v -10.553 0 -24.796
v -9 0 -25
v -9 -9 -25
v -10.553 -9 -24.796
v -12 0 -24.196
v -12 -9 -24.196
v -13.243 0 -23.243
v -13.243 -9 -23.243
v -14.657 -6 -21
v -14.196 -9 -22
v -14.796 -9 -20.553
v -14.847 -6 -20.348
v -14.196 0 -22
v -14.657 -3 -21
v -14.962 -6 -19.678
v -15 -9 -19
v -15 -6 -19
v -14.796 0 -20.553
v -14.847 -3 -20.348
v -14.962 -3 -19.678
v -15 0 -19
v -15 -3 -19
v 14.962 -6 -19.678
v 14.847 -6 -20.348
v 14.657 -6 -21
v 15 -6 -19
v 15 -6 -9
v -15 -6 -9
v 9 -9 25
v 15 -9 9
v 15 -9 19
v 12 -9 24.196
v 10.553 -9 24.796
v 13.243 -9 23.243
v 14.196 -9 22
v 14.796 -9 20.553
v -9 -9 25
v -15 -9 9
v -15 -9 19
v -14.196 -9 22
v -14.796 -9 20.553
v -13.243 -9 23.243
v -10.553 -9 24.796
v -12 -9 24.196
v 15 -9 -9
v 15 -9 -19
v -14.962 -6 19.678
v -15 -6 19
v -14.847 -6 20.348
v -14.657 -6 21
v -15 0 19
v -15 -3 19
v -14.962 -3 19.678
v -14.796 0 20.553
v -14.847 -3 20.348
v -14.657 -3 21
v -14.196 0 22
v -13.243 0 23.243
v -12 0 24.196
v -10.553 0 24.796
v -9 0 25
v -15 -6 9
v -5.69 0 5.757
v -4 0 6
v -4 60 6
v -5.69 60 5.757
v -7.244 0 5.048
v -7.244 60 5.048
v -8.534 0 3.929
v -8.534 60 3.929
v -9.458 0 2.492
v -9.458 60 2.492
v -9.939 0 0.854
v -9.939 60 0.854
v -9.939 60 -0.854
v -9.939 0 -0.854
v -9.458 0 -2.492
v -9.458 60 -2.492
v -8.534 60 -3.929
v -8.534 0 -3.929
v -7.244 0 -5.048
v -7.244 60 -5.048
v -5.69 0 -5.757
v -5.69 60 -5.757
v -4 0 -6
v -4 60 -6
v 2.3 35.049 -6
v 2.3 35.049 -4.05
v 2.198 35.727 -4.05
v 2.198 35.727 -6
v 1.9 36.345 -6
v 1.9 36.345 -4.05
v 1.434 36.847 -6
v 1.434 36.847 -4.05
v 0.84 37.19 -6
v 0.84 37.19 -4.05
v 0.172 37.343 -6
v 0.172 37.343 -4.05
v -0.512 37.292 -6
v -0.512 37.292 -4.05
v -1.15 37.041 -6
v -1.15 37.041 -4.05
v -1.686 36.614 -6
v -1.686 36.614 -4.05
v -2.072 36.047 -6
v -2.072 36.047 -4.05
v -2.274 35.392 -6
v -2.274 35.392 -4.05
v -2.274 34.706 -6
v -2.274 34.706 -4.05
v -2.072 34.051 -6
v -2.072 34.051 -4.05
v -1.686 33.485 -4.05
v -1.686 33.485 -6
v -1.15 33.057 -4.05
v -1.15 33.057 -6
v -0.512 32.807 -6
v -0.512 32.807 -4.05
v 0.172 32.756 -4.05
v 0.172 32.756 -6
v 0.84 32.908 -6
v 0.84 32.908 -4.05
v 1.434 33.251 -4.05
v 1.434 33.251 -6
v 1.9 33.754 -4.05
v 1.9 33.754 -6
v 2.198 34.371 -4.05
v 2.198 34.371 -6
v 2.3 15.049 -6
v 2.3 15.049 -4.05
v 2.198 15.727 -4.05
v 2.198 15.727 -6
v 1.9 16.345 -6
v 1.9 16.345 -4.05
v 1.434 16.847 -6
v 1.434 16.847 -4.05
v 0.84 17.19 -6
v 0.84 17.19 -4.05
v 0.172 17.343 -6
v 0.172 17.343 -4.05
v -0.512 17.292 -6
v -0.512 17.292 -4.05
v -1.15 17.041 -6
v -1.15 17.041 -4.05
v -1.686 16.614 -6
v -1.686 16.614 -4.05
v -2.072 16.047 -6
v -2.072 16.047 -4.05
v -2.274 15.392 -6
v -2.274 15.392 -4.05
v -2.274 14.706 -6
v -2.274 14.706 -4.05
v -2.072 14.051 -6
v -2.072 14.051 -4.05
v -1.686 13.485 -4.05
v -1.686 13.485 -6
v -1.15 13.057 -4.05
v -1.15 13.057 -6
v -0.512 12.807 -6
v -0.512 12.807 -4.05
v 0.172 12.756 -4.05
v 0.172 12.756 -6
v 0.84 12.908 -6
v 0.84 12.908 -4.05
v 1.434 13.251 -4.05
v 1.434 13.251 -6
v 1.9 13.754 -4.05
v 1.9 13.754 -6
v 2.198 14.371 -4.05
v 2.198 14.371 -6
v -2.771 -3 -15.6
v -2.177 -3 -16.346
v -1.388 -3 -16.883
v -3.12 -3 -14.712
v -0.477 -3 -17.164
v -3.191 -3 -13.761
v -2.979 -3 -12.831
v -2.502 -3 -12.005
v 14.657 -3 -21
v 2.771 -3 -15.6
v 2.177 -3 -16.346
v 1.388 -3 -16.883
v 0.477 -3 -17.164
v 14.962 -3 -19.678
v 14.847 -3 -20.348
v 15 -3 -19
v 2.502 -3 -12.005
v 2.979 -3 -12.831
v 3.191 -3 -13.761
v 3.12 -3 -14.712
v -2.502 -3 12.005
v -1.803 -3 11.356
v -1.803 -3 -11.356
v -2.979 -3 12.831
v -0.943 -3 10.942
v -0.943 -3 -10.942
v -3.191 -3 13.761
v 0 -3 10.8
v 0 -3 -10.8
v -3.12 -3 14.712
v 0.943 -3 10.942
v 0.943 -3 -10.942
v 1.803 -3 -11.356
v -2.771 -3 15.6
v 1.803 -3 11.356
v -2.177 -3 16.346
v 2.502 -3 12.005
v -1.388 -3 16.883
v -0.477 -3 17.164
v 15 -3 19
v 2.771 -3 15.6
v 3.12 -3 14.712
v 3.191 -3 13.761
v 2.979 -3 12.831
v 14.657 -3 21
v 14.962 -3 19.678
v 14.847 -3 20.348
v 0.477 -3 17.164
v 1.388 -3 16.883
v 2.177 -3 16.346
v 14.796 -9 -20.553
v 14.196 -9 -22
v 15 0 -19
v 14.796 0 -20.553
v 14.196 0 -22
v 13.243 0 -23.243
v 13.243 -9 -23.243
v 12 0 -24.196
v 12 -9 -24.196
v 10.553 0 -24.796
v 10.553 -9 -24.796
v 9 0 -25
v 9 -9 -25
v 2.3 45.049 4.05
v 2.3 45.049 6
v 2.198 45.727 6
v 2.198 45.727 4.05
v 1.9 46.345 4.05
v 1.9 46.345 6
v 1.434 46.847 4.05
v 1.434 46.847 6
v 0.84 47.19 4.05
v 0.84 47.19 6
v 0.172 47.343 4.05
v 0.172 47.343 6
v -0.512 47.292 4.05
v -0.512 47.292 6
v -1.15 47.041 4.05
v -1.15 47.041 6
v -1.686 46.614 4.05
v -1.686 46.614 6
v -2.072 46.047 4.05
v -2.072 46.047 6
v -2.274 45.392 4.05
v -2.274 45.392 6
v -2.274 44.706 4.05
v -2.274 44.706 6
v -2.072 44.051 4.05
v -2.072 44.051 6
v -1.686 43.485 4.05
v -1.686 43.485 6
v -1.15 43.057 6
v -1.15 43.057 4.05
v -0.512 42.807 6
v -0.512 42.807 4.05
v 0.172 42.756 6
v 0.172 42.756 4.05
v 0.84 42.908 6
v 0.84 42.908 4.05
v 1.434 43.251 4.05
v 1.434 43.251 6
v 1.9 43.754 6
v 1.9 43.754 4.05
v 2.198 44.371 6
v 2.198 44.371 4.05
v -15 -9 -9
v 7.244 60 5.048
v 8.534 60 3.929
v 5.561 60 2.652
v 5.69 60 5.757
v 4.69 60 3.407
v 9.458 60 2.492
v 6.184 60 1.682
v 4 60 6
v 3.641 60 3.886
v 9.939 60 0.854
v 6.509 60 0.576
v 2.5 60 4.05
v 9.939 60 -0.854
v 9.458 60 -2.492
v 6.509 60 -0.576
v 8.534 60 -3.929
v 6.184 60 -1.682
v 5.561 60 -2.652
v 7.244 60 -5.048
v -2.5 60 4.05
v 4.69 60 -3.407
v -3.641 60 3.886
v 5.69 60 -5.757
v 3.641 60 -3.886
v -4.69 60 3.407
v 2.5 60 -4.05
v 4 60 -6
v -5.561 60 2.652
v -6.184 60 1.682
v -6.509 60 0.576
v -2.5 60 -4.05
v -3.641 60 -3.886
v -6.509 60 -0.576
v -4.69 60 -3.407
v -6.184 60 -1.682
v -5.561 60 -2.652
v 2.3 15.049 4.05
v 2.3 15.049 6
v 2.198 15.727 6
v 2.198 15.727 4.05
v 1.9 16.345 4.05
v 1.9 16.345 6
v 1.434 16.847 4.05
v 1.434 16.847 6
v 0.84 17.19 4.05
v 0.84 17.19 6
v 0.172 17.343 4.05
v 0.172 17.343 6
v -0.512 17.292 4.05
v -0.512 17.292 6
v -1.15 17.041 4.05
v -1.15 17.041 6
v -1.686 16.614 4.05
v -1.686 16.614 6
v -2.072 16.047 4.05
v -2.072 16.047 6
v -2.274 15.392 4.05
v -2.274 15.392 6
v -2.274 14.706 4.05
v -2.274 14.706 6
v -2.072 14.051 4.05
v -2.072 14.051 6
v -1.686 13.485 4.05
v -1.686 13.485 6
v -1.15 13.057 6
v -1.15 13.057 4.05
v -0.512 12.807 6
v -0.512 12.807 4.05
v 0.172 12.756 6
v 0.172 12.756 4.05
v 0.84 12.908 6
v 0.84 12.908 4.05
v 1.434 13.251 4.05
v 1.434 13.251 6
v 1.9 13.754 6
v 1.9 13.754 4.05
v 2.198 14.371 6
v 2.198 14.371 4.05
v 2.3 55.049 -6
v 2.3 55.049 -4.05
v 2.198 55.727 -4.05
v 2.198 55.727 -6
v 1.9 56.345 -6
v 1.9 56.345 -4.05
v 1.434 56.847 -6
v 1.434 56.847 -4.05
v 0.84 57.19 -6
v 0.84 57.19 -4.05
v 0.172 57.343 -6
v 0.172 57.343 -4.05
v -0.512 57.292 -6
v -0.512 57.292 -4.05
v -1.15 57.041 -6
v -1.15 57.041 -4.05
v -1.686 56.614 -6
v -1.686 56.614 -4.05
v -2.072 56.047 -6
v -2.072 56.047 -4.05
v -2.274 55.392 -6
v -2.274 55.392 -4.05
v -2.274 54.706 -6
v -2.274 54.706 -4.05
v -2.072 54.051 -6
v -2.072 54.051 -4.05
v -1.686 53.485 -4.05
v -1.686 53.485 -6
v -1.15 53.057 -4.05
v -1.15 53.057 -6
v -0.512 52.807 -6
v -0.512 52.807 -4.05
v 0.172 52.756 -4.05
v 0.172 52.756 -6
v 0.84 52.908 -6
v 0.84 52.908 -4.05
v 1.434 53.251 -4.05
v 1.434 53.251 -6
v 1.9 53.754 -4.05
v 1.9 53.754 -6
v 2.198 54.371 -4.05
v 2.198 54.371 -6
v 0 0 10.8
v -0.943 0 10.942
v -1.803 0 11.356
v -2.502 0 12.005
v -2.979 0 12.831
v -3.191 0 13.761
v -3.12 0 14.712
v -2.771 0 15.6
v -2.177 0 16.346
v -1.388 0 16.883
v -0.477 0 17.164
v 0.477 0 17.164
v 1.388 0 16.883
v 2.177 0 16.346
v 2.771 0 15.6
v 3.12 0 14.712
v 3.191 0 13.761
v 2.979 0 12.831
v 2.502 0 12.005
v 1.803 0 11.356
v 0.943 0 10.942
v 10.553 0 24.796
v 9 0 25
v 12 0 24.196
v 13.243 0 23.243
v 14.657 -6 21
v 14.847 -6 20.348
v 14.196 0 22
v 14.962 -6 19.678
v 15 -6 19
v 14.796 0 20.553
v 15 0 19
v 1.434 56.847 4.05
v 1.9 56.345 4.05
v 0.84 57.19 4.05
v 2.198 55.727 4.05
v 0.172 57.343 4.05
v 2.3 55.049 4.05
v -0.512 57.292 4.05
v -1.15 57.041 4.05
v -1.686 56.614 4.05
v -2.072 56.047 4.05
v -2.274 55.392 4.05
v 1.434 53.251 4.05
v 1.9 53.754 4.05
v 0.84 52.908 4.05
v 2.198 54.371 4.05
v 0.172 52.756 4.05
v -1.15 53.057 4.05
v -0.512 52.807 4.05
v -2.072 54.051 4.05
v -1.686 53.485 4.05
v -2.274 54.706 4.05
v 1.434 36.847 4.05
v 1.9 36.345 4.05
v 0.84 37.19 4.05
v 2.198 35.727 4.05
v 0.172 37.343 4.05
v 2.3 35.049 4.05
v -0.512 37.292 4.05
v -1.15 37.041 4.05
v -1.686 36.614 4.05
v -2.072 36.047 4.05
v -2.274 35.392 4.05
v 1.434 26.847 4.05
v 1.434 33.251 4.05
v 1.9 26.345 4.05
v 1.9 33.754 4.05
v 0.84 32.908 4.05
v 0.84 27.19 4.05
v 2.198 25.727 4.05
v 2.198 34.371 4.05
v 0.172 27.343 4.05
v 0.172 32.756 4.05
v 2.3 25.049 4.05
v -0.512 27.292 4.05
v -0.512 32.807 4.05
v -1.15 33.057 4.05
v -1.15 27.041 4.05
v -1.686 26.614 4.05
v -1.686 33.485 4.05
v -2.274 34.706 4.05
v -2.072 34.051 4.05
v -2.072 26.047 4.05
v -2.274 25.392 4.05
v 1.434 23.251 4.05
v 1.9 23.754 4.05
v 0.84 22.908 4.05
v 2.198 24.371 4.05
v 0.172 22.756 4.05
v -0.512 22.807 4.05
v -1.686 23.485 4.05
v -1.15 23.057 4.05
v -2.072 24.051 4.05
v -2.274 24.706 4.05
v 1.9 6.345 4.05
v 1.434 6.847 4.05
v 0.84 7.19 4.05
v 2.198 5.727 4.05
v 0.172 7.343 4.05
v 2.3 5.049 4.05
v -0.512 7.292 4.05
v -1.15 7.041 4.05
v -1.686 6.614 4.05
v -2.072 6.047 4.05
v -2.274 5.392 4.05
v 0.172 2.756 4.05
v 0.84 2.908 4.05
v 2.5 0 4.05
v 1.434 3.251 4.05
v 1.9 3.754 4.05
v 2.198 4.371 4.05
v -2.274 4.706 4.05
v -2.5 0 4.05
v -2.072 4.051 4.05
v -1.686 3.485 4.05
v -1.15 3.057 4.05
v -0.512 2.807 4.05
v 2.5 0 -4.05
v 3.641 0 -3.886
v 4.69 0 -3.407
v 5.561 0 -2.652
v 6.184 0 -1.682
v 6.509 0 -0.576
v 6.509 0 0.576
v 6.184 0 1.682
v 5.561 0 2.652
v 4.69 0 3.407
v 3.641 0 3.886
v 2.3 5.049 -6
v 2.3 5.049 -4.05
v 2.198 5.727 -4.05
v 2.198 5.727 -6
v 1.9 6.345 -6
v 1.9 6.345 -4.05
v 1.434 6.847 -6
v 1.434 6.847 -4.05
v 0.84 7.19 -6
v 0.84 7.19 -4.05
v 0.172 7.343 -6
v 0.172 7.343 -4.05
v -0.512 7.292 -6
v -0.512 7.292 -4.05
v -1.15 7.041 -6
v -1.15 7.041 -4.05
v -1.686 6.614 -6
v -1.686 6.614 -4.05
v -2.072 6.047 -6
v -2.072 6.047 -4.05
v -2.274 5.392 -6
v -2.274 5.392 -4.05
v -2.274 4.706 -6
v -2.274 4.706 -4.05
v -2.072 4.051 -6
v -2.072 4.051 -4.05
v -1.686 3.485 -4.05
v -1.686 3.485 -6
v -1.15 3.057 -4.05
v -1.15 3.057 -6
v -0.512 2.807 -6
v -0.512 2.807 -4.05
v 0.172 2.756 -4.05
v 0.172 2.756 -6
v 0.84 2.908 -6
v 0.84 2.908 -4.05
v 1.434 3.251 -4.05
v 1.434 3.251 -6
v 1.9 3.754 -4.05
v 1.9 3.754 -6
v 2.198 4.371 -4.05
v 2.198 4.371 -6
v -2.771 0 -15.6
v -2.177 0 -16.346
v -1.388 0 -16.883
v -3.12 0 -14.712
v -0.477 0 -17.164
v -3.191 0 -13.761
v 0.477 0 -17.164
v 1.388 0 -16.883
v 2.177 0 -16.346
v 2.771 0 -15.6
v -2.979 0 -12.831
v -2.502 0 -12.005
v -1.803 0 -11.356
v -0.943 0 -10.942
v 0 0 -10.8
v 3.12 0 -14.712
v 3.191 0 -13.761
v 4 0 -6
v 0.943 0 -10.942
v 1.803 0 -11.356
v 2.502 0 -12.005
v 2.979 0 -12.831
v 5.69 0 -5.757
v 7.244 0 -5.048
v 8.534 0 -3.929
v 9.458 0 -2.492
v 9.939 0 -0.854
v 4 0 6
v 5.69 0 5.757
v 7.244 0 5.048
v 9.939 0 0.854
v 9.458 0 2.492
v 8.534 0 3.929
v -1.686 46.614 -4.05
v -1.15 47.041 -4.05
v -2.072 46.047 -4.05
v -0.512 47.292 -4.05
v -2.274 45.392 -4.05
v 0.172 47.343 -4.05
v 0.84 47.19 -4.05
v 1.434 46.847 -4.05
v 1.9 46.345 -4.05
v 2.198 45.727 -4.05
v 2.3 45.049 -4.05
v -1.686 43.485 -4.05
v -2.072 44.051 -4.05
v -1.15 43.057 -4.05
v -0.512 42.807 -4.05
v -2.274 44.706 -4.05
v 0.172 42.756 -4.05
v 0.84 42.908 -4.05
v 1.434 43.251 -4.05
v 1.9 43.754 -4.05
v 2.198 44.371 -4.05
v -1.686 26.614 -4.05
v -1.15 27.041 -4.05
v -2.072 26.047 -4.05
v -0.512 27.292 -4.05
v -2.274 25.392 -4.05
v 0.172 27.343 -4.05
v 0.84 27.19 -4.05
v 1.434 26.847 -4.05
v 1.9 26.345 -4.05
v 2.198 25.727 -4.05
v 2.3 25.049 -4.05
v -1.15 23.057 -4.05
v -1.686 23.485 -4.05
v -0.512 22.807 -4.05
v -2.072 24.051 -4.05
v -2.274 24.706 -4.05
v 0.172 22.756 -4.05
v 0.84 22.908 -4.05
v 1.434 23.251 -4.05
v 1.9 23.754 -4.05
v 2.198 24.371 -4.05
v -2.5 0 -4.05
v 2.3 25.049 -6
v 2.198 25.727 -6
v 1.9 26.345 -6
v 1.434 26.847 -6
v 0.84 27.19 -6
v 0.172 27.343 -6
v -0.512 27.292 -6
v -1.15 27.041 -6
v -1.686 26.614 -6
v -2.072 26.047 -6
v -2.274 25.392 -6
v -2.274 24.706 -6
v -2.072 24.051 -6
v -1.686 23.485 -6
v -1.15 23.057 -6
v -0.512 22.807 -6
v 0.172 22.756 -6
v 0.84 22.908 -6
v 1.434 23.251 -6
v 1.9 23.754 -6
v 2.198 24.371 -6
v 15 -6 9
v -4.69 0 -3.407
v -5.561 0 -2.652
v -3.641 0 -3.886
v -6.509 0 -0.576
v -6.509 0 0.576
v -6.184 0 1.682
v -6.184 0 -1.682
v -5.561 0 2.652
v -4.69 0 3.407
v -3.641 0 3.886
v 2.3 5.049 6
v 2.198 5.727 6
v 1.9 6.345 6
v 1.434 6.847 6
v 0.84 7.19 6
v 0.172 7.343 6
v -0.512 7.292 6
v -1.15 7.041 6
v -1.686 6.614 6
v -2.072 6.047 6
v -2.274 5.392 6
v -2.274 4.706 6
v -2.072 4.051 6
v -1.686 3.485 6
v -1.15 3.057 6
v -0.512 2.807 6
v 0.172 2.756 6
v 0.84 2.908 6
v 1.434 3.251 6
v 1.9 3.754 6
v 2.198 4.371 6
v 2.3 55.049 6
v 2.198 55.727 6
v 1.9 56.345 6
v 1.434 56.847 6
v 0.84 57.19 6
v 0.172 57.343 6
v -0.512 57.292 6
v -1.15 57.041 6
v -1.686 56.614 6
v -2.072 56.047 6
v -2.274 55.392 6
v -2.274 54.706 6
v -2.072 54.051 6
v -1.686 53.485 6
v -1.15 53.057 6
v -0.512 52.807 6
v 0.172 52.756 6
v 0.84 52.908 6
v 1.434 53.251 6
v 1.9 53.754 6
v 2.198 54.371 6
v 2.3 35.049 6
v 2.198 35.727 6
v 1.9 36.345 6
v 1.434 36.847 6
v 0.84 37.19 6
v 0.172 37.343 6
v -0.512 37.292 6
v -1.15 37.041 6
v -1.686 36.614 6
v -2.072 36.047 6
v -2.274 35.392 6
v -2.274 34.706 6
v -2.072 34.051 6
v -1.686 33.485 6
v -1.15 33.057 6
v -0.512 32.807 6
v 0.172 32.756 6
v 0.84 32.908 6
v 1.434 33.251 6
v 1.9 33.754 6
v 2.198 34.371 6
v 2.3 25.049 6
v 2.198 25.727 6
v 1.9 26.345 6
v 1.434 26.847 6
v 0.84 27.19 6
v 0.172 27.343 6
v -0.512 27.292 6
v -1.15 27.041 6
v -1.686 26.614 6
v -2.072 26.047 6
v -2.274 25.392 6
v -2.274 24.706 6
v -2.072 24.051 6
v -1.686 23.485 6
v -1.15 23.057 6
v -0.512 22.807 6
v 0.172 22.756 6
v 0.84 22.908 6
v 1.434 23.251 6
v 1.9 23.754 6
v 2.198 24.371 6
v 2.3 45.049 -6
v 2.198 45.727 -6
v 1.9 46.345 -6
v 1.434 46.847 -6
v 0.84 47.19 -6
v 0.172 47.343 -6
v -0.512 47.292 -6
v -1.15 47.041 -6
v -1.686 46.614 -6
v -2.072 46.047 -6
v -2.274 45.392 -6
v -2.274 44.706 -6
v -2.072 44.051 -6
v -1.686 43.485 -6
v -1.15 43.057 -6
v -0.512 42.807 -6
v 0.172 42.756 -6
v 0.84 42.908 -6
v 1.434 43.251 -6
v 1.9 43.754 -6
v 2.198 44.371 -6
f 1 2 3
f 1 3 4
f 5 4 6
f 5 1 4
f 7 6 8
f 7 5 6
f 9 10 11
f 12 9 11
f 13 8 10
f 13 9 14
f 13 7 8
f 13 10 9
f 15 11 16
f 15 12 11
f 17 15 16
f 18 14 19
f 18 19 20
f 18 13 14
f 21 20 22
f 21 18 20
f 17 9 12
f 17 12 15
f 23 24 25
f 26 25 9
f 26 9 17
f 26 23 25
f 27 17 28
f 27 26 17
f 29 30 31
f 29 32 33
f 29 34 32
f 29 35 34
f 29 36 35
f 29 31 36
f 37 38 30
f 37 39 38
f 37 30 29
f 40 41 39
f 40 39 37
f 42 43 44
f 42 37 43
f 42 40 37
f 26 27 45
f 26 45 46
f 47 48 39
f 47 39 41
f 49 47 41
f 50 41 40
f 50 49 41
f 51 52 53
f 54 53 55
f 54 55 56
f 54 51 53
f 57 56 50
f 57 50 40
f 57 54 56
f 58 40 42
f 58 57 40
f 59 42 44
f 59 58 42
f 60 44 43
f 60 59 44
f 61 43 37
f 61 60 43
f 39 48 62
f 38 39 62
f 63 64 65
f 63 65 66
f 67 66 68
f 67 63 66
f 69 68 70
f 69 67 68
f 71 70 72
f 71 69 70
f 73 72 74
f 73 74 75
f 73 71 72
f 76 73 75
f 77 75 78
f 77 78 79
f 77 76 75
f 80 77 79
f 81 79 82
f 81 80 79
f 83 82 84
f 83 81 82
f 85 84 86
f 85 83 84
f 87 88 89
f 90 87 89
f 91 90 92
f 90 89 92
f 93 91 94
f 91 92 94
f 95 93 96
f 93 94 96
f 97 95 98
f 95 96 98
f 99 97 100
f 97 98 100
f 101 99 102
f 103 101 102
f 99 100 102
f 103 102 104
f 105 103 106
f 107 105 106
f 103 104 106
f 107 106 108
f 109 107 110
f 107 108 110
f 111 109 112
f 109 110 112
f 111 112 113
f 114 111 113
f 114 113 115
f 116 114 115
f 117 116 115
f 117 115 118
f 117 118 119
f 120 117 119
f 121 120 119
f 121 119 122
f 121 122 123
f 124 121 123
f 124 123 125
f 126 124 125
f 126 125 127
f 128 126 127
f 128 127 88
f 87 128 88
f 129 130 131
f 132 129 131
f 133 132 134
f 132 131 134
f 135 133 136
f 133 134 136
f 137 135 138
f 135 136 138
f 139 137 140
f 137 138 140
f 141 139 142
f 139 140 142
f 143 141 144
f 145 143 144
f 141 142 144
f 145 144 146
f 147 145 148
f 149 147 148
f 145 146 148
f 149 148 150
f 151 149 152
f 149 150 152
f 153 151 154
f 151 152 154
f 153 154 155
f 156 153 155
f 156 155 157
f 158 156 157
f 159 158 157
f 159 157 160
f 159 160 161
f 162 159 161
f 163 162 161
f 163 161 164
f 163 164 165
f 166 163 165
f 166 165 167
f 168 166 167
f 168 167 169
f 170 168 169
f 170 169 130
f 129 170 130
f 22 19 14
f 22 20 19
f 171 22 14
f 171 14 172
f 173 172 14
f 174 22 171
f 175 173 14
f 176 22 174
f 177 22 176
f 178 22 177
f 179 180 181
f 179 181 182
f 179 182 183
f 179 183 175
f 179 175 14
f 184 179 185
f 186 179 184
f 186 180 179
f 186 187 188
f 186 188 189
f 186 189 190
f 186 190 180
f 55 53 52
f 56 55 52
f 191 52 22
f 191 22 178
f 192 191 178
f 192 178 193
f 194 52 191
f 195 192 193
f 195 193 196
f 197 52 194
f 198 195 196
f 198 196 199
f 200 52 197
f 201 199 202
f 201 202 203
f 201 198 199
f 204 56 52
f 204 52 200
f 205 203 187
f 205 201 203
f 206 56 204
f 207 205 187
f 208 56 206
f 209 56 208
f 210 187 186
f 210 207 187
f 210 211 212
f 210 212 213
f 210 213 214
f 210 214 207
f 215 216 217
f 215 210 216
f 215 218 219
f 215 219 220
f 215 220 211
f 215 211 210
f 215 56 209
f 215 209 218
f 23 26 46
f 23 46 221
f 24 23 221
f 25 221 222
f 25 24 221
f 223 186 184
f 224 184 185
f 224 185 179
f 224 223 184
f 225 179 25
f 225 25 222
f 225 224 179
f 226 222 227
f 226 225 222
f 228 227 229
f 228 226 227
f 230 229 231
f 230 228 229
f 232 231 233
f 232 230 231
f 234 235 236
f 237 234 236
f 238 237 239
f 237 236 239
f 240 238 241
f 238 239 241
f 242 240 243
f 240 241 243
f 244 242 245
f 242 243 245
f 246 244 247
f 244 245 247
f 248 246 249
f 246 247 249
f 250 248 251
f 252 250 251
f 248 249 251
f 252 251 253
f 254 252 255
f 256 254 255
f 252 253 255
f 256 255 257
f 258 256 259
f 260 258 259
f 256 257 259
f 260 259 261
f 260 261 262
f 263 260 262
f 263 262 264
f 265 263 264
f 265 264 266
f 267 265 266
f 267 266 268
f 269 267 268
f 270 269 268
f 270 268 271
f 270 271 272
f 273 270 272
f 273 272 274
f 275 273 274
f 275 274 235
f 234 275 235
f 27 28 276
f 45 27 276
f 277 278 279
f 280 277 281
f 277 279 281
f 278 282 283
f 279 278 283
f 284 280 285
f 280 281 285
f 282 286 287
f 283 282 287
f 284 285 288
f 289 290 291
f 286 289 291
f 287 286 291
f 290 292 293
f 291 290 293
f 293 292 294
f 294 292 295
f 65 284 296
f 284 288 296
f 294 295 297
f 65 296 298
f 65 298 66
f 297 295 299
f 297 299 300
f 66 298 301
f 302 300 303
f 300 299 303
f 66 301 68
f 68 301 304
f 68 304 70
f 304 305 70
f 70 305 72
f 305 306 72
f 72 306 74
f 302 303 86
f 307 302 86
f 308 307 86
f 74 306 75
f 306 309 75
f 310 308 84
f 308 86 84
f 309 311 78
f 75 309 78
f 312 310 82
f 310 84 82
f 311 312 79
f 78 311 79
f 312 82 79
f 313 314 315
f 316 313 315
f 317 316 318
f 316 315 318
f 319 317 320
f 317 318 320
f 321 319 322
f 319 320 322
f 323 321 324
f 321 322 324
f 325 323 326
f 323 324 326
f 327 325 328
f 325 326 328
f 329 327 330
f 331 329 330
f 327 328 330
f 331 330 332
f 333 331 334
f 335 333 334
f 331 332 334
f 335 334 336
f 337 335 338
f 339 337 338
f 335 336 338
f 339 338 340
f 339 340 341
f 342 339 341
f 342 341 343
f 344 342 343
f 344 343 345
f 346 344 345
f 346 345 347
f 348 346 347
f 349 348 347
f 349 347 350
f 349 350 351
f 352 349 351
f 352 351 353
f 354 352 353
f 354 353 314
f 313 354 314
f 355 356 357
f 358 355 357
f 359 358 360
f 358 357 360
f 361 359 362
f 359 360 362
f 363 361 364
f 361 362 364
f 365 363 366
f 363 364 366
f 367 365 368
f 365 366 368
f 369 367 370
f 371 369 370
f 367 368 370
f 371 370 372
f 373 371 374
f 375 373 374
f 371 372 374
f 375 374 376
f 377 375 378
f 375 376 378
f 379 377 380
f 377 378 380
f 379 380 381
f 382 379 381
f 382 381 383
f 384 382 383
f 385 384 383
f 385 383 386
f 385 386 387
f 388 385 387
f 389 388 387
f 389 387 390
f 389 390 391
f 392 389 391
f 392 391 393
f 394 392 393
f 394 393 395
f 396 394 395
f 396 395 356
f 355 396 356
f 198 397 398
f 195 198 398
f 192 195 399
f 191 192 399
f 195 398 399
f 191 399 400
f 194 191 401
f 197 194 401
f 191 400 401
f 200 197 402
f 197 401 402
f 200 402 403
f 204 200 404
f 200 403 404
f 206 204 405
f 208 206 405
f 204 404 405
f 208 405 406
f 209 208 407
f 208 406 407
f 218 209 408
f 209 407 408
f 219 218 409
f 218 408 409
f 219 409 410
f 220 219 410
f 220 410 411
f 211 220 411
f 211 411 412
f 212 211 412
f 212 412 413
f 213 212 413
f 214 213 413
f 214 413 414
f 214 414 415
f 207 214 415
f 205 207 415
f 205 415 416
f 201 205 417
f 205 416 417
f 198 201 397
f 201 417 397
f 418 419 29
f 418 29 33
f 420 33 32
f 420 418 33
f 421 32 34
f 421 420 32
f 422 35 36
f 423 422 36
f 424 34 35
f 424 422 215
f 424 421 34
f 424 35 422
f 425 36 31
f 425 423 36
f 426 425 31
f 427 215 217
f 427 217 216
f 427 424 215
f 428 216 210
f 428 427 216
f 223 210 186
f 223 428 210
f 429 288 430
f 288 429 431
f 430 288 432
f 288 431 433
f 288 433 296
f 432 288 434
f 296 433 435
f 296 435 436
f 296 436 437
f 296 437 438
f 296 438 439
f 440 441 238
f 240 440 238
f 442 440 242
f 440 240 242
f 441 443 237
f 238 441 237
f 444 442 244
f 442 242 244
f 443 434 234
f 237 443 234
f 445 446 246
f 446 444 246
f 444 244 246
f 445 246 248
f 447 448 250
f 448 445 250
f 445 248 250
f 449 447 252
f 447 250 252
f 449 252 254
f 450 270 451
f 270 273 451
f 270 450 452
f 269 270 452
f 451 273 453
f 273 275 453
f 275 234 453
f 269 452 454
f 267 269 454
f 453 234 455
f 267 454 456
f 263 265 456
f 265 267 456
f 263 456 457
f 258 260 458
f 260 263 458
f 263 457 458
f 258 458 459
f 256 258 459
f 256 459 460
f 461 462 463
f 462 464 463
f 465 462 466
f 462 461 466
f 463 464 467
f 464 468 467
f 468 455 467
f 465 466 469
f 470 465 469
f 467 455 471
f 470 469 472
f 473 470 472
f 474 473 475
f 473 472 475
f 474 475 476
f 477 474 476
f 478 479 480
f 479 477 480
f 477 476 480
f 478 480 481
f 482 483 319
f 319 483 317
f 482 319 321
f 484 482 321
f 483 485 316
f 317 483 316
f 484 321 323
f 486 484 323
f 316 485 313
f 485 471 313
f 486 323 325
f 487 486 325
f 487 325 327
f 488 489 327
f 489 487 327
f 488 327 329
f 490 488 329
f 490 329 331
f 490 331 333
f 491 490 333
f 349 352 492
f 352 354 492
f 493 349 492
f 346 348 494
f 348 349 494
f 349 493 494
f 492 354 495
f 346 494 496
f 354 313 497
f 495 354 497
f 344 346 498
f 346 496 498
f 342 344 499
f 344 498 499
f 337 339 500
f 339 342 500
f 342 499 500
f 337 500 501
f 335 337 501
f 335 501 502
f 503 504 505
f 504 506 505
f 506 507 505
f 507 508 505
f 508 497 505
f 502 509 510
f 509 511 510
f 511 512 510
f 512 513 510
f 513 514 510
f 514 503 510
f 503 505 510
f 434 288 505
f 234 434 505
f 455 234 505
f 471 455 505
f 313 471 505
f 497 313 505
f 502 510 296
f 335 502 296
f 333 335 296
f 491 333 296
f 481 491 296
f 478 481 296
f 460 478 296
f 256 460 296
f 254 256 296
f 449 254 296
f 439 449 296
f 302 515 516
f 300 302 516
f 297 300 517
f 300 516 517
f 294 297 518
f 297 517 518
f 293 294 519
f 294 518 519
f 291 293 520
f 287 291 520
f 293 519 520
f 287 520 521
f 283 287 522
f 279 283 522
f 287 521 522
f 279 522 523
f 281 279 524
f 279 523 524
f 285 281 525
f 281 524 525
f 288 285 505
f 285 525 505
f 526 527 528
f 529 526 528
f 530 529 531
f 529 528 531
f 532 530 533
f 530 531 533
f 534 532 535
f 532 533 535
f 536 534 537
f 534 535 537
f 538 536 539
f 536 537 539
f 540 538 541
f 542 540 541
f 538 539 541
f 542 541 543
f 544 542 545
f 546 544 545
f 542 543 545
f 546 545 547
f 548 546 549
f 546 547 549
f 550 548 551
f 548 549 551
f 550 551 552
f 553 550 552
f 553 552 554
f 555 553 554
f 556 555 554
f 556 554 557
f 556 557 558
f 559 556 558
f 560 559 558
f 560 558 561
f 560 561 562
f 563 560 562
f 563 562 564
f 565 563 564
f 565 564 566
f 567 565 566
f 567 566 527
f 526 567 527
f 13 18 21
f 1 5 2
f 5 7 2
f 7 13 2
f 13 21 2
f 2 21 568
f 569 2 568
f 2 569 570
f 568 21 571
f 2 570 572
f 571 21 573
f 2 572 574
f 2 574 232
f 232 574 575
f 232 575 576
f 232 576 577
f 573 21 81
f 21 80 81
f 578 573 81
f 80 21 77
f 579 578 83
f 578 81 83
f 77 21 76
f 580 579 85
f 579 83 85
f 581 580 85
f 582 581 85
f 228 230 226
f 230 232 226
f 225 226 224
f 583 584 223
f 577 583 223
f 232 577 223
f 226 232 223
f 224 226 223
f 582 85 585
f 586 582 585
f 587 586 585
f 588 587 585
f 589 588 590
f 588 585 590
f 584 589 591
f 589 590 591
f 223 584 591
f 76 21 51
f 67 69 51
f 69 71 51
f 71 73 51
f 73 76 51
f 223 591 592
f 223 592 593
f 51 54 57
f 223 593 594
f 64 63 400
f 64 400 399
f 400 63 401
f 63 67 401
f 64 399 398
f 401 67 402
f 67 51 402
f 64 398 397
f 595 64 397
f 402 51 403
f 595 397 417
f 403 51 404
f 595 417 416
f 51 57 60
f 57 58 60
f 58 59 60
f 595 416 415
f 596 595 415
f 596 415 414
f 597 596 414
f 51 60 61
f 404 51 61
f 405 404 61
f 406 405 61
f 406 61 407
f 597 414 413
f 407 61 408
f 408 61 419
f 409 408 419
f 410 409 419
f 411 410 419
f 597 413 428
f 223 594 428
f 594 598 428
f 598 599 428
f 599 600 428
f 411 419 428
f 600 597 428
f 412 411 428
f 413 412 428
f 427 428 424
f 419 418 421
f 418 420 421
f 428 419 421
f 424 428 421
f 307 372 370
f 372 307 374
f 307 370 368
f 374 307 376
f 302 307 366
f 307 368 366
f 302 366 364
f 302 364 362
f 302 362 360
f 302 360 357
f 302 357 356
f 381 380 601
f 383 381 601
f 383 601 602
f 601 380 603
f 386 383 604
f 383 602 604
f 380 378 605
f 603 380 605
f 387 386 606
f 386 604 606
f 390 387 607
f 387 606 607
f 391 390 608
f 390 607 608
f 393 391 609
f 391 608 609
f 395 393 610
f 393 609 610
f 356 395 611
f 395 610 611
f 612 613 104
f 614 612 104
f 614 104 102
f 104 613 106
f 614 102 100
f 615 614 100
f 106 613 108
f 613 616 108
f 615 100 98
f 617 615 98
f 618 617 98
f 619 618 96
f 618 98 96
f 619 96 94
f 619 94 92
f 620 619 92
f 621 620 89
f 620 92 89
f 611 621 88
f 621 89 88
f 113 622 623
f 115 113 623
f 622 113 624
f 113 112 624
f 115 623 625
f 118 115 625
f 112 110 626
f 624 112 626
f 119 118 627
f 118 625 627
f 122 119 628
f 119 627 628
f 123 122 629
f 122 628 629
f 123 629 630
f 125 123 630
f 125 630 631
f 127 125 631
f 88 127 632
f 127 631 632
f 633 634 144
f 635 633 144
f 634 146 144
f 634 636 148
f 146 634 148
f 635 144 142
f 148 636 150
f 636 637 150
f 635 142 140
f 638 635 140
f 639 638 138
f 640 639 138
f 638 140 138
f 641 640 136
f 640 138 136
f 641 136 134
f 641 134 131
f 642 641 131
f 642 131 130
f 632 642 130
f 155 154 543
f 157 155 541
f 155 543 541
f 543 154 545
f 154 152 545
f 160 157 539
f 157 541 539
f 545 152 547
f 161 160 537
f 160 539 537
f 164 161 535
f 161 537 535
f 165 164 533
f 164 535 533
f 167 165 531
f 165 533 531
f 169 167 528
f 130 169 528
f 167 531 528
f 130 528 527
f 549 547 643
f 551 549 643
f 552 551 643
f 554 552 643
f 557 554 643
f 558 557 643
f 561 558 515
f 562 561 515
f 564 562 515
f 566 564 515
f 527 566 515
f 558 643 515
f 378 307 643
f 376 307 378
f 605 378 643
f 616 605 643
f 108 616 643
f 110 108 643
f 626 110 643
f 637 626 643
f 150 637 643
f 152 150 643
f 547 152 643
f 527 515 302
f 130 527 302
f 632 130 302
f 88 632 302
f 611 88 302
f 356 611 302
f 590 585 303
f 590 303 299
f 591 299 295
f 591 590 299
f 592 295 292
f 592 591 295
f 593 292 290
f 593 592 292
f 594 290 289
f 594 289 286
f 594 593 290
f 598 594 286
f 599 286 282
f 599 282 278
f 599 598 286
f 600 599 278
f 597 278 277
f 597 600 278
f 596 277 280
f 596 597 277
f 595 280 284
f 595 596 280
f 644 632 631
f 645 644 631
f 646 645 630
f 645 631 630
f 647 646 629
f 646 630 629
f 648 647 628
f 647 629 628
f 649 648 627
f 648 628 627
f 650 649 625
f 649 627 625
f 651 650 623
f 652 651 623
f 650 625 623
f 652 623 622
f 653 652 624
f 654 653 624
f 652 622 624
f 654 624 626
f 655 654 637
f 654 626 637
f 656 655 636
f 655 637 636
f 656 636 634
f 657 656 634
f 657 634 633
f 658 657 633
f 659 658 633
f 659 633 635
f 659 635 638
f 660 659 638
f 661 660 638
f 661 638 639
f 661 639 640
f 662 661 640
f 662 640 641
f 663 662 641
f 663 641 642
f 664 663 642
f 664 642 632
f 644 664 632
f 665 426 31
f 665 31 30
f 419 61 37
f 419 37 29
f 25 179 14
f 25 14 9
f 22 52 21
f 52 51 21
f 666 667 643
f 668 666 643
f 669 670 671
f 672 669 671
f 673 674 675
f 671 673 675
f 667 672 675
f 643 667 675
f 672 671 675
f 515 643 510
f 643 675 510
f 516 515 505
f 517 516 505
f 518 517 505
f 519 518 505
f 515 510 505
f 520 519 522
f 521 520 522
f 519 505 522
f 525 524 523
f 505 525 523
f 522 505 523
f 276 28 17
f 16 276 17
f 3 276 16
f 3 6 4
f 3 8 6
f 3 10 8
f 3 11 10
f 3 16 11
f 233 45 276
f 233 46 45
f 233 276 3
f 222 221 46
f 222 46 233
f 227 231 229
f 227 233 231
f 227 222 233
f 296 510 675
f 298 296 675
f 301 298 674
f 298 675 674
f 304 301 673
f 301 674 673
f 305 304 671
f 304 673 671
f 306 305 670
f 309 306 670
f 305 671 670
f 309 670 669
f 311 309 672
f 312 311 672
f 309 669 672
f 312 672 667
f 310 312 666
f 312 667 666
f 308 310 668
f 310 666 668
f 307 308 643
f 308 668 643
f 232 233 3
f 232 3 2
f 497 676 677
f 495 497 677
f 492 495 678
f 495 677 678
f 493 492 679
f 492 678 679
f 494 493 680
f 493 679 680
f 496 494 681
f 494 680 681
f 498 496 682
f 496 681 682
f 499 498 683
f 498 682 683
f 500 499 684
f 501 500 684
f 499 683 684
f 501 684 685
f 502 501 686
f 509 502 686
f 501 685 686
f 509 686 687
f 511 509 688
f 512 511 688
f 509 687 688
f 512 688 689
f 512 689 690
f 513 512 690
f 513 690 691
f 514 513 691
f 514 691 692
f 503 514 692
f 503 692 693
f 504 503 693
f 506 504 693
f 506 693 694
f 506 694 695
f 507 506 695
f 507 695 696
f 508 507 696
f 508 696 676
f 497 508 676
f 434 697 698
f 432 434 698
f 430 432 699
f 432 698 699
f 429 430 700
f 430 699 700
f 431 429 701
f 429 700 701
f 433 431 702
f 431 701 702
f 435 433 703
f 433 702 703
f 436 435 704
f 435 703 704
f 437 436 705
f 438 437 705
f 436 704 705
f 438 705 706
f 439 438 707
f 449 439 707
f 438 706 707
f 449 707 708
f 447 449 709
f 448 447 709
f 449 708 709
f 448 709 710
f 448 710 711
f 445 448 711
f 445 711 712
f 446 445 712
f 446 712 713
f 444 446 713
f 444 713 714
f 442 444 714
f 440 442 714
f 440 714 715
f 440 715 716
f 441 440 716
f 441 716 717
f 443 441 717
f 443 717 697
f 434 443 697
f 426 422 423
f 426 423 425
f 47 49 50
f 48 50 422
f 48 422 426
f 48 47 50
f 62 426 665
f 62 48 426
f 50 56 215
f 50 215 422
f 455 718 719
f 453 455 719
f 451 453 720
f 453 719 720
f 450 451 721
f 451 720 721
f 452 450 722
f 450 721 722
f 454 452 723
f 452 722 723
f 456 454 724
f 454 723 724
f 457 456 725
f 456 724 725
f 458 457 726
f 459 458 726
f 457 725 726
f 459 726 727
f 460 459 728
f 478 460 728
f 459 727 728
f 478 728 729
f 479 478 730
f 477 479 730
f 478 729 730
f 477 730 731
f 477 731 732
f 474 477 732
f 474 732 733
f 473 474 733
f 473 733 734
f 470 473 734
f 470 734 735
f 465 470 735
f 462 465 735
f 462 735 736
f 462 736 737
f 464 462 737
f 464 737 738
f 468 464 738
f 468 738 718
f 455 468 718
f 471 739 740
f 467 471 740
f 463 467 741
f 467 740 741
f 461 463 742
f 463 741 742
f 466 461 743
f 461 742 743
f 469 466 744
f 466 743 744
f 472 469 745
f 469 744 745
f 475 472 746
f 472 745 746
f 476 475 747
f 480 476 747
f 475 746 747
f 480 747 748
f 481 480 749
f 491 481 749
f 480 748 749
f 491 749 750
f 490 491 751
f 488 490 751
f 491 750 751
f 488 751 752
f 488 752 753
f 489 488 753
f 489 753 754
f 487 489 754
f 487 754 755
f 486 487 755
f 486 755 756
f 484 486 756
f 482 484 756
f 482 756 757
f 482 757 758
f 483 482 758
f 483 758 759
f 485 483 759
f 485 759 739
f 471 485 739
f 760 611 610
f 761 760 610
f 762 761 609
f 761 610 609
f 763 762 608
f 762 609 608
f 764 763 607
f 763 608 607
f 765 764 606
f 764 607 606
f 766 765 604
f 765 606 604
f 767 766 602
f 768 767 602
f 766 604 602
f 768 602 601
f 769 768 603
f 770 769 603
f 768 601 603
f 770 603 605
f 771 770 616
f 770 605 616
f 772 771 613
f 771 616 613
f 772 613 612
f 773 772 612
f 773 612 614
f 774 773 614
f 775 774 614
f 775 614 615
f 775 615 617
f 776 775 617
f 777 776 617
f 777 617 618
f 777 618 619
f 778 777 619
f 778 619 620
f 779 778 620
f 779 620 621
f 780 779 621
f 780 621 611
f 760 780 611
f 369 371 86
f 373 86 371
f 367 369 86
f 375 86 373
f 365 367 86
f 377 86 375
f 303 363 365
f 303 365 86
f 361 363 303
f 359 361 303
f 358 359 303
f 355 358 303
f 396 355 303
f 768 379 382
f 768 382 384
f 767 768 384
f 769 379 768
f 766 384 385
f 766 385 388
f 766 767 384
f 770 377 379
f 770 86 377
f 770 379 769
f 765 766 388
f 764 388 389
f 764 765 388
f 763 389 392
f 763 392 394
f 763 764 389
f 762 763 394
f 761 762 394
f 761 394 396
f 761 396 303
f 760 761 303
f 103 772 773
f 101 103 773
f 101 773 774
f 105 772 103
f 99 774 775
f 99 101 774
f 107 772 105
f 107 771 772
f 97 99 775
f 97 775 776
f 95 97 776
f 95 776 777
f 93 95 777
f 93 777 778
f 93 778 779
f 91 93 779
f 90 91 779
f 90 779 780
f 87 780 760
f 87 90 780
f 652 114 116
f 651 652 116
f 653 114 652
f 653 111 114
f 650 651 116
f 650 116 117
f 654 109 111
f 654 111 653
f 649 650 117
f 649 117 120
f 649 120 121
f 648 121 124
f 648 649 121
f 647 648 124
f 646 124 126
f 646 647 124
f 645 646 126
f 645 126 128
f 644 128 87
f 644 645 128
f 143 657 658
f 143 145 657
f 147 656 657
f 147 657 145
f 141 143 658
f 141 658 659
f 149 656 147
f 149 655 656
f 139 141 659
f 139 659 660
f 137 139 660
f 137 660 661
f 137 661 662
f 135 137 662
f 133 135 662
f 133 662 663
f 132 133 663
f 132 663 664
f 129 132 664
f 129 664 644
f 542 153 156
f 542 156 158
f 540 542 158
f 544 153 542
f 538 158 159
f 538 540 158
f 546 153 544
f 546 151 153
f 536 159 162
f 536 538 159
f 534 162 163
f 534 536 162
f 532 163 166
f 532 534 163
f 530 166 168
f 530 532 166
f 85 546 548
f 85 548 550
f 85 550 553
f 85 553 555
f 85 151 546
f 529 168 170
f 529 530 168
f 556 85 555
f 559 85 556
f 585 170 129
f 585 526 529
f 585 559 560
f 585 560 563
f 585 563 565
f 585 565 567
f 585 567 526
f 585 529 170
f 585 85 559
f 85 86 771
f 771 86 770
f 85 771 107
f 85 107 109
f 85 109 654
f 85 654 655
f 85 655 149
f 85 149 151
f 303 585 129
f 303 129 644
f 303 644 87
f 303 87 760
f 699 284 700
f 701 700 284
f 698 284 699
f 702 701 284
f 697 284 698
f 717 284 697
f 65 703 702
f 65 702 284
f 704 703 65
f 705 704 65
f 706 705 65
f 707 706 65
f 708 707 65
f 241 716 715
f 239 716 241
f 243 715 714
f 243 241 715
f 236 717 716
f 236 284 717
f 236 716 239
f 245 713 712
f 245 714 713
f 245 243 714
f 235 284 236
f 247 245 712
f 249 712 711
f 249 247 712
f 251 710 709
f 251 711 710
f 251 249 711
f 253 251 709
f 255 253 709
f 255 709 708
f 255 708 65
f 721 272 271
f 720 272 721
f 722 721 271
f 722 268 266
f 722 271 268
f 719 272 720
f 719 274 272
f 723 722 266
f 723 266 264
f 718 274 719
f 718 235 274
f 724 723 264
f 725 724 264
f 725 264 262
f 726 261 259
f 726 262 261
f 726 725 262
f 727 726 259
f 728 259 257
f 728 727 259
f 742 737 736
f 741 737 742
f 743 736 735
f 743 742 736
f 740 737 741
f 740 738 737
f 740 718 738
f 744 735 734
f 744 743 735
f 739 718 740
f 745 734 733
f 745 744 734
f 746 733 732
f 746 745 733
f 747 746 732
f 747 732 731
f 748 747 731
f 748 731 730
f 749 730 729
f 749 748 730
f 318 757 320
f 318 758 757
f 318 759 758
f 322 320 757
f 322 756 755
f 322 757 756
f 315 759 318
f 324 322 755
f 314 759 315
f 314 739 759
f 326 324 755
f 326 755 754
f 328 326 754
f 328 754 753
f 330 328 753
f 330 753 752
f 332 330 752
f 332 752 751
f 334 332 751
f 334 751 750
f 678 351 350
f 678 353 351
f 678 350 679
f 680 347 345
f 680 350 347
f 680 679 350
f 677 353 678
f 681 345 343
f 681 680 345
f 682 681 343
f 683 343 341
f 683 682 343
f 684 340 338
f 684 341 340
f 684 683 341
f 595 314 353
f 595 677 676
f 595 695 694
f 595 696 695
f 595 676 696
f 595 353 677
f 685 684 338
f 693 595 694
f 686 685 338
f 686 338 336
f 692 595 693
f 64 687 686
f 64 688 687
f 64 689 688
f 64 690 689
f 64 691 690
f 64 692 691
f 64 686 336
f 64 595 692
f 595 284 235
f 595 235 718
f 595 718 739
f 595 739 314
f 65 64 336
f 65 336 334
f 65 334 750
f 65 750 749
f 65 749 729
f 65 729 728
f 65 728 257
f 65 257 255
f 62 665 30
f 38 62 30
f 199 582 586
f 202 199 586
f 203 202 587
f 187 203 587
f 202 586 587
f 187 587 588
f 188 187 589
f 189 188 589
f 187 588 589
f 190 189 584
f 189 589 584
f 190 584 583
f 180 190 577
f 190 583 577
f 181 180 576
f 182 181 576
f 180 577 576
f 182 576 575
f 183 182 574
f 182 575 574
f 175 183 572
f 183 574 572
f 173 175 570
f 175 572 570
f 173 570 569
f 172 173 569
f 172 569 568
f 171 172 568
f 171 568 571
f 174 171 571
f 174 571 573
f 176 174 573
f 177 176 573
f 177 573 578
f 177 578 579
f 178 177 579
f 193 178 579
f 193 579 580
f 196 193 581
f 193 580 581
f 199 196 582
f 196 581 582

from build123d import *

# Parameters (mm, degrees)
EXTRUDE_1_DEPTH     = 60
SKETCH_3_R          = 2.3
CUT_EXTRUDE_1_DEPTH = 30
SKETCH_4_W          = 30
SKETCH_4_H          = 50
EXTRUDE_2_DEPTH     = 3
EXTRUDE_3_DEPTH     = 15
SKETCH_6_W          = 47.657493386
SKETCH_6_H          = 61.593201797
CUT_EXTRUDE_2_DEPTH = 30
SKETCH_7_R          = 3.2
CUT_EXTRUDE_3_DEPTH = 3


with BuildPart() as part:
    # 草图2 → 凸台-拉伸1 (new body)
    with BuildSketch(Plane(origin=(0, 0, 0), x_dir=(1, 0, 0), z_dir=(0, 1, 0))):
        with BuildLine():
            Line((-4, 6), (4, 6))
            ThreePointArc((4, 6), (10, 0), (4, -6))
            Line((4, -6), (-4, -6))
            ThreePointArc((-4, -6), (-10, 0), (-4, 6))
        make_face()
        with BuildLine():
            Line((-2.5, 4.05), (2.5, 4.05))
            ThreePointArc((2.5, 4.05), (6.55, 0), (2.5, -4.05))
            Line((2.5, -4.05), (-2.5, -4.05))
            ThreePointArc((-2.5, -4.05), (-6.55, 0), (-2.5, 4.05))
        make_face(mode=Mode.SUBTRACT)
    extrude(amount=EXTRUDE_1_DEPTH)

    # 草图3 → 切除-拉伸1 (cut)
    with BuildSketch(Plane.XY.offset(6)):
        with Locations((0, 55.049214592)):
            Circle(SKETCH_3_R)
        with Locations((0, 45.049214592)):
            Circle(SKETCH_3_R)
        with Locations((0, 35.049214592)):
            Circle(SKETCH_3_R)
        with Locations((0, 25.049214592)):
            Circle(SKETCH_3_R)
        with Locations((0, 15.049214592)):
            Circle(SKETCH_3_R)
        with Locations((0, 5.049214592)):
            Circle(SKETCH_3_R)
    extrude(amount=-CUT_EXTRUDE_1_DEPTH, mode=Mode.SUBTRACT)

    # 草图4 → 凸台-拉伸2 (add)
    with BuildSketch(Plane.XZ):
        Rectangle(SKETCH_4_W, SKETCH_4_H)
    extrude(amount=EXTRUDE_2_DEPTH)

    # 草图5 → 凸台-拉伸3 (add, symmetric)
    with BuildSketch(Plane(origin=(0, 0, 0), x_dir=(0, 0, -1), z_dir=(1, 0, 0))):
        Polygon((-25, -3), (-21, -3), (-21, -6), (-9, -6), (-9, -9), (-25, -9), (-25, -6), align=None)
        Polygon((25, -3), (21, -3), (21, -6), (9, -6), (9, -9), (25, -9), (25, -6), align=None)
    extrude(amount=EXTRUDE_3_DEPTH, both=True)

    # 草图6 → 切除-拉伸2 (cut)
    with BuildSketch(Plane(origin=(0, 0, 0), x_dir=(1, 0, 0), z_dir=(0, 1, 0))):
        with Locations((1.592624165, 0.101186893)):
            Rectangle(SKETCH_6_W, SKETCH_6_H)
        with BuildLine():
            Line((15, -19), (15, 19))
            ThreePointArc((15, 19), (13.242640687, 23.242640687), (9, 25))
            Line((9, 25), (-9, 25))
            ThreePointArc((-9, 25), (-13.242640687, 23.242640687), (-15, 19))
            Line((-15, 19), (-15, -19))
            ThreePointArc((-15, -19), (-13.242640687, -23.242640687), (-9, -25))
            Line((-9, -25), (9, -25))
            ThreePointArc((9, -25), (13.242640687, -23.242640687), (15, -19))
        make_face(mode=Mode.SUBTRACT)
    extrude(amount=-CUT_EXTRUDE_2_DEPTH, mode=Mode.SUBTRACT)

    # 草图7 → 切除-拉伸3 (cut)
    with BuildSketch(Plane(origin=(0, 0, 0), x_dir=(1, 0, 0), z_dir=(0, 1, 0))):
        with Locations(Location((0, 14, 0), (0, 0, 270))):
            Circle(SKETCH_7_R)
        with Locations(Location((0, -14, 0), (0, 0, 90))):
            Circle(SKETCH_7_R)
    extrude(amount=-CUT_EXTRUDE_3_DEPTH, mode=Mode.SUBTRACT)


solid = part.part
